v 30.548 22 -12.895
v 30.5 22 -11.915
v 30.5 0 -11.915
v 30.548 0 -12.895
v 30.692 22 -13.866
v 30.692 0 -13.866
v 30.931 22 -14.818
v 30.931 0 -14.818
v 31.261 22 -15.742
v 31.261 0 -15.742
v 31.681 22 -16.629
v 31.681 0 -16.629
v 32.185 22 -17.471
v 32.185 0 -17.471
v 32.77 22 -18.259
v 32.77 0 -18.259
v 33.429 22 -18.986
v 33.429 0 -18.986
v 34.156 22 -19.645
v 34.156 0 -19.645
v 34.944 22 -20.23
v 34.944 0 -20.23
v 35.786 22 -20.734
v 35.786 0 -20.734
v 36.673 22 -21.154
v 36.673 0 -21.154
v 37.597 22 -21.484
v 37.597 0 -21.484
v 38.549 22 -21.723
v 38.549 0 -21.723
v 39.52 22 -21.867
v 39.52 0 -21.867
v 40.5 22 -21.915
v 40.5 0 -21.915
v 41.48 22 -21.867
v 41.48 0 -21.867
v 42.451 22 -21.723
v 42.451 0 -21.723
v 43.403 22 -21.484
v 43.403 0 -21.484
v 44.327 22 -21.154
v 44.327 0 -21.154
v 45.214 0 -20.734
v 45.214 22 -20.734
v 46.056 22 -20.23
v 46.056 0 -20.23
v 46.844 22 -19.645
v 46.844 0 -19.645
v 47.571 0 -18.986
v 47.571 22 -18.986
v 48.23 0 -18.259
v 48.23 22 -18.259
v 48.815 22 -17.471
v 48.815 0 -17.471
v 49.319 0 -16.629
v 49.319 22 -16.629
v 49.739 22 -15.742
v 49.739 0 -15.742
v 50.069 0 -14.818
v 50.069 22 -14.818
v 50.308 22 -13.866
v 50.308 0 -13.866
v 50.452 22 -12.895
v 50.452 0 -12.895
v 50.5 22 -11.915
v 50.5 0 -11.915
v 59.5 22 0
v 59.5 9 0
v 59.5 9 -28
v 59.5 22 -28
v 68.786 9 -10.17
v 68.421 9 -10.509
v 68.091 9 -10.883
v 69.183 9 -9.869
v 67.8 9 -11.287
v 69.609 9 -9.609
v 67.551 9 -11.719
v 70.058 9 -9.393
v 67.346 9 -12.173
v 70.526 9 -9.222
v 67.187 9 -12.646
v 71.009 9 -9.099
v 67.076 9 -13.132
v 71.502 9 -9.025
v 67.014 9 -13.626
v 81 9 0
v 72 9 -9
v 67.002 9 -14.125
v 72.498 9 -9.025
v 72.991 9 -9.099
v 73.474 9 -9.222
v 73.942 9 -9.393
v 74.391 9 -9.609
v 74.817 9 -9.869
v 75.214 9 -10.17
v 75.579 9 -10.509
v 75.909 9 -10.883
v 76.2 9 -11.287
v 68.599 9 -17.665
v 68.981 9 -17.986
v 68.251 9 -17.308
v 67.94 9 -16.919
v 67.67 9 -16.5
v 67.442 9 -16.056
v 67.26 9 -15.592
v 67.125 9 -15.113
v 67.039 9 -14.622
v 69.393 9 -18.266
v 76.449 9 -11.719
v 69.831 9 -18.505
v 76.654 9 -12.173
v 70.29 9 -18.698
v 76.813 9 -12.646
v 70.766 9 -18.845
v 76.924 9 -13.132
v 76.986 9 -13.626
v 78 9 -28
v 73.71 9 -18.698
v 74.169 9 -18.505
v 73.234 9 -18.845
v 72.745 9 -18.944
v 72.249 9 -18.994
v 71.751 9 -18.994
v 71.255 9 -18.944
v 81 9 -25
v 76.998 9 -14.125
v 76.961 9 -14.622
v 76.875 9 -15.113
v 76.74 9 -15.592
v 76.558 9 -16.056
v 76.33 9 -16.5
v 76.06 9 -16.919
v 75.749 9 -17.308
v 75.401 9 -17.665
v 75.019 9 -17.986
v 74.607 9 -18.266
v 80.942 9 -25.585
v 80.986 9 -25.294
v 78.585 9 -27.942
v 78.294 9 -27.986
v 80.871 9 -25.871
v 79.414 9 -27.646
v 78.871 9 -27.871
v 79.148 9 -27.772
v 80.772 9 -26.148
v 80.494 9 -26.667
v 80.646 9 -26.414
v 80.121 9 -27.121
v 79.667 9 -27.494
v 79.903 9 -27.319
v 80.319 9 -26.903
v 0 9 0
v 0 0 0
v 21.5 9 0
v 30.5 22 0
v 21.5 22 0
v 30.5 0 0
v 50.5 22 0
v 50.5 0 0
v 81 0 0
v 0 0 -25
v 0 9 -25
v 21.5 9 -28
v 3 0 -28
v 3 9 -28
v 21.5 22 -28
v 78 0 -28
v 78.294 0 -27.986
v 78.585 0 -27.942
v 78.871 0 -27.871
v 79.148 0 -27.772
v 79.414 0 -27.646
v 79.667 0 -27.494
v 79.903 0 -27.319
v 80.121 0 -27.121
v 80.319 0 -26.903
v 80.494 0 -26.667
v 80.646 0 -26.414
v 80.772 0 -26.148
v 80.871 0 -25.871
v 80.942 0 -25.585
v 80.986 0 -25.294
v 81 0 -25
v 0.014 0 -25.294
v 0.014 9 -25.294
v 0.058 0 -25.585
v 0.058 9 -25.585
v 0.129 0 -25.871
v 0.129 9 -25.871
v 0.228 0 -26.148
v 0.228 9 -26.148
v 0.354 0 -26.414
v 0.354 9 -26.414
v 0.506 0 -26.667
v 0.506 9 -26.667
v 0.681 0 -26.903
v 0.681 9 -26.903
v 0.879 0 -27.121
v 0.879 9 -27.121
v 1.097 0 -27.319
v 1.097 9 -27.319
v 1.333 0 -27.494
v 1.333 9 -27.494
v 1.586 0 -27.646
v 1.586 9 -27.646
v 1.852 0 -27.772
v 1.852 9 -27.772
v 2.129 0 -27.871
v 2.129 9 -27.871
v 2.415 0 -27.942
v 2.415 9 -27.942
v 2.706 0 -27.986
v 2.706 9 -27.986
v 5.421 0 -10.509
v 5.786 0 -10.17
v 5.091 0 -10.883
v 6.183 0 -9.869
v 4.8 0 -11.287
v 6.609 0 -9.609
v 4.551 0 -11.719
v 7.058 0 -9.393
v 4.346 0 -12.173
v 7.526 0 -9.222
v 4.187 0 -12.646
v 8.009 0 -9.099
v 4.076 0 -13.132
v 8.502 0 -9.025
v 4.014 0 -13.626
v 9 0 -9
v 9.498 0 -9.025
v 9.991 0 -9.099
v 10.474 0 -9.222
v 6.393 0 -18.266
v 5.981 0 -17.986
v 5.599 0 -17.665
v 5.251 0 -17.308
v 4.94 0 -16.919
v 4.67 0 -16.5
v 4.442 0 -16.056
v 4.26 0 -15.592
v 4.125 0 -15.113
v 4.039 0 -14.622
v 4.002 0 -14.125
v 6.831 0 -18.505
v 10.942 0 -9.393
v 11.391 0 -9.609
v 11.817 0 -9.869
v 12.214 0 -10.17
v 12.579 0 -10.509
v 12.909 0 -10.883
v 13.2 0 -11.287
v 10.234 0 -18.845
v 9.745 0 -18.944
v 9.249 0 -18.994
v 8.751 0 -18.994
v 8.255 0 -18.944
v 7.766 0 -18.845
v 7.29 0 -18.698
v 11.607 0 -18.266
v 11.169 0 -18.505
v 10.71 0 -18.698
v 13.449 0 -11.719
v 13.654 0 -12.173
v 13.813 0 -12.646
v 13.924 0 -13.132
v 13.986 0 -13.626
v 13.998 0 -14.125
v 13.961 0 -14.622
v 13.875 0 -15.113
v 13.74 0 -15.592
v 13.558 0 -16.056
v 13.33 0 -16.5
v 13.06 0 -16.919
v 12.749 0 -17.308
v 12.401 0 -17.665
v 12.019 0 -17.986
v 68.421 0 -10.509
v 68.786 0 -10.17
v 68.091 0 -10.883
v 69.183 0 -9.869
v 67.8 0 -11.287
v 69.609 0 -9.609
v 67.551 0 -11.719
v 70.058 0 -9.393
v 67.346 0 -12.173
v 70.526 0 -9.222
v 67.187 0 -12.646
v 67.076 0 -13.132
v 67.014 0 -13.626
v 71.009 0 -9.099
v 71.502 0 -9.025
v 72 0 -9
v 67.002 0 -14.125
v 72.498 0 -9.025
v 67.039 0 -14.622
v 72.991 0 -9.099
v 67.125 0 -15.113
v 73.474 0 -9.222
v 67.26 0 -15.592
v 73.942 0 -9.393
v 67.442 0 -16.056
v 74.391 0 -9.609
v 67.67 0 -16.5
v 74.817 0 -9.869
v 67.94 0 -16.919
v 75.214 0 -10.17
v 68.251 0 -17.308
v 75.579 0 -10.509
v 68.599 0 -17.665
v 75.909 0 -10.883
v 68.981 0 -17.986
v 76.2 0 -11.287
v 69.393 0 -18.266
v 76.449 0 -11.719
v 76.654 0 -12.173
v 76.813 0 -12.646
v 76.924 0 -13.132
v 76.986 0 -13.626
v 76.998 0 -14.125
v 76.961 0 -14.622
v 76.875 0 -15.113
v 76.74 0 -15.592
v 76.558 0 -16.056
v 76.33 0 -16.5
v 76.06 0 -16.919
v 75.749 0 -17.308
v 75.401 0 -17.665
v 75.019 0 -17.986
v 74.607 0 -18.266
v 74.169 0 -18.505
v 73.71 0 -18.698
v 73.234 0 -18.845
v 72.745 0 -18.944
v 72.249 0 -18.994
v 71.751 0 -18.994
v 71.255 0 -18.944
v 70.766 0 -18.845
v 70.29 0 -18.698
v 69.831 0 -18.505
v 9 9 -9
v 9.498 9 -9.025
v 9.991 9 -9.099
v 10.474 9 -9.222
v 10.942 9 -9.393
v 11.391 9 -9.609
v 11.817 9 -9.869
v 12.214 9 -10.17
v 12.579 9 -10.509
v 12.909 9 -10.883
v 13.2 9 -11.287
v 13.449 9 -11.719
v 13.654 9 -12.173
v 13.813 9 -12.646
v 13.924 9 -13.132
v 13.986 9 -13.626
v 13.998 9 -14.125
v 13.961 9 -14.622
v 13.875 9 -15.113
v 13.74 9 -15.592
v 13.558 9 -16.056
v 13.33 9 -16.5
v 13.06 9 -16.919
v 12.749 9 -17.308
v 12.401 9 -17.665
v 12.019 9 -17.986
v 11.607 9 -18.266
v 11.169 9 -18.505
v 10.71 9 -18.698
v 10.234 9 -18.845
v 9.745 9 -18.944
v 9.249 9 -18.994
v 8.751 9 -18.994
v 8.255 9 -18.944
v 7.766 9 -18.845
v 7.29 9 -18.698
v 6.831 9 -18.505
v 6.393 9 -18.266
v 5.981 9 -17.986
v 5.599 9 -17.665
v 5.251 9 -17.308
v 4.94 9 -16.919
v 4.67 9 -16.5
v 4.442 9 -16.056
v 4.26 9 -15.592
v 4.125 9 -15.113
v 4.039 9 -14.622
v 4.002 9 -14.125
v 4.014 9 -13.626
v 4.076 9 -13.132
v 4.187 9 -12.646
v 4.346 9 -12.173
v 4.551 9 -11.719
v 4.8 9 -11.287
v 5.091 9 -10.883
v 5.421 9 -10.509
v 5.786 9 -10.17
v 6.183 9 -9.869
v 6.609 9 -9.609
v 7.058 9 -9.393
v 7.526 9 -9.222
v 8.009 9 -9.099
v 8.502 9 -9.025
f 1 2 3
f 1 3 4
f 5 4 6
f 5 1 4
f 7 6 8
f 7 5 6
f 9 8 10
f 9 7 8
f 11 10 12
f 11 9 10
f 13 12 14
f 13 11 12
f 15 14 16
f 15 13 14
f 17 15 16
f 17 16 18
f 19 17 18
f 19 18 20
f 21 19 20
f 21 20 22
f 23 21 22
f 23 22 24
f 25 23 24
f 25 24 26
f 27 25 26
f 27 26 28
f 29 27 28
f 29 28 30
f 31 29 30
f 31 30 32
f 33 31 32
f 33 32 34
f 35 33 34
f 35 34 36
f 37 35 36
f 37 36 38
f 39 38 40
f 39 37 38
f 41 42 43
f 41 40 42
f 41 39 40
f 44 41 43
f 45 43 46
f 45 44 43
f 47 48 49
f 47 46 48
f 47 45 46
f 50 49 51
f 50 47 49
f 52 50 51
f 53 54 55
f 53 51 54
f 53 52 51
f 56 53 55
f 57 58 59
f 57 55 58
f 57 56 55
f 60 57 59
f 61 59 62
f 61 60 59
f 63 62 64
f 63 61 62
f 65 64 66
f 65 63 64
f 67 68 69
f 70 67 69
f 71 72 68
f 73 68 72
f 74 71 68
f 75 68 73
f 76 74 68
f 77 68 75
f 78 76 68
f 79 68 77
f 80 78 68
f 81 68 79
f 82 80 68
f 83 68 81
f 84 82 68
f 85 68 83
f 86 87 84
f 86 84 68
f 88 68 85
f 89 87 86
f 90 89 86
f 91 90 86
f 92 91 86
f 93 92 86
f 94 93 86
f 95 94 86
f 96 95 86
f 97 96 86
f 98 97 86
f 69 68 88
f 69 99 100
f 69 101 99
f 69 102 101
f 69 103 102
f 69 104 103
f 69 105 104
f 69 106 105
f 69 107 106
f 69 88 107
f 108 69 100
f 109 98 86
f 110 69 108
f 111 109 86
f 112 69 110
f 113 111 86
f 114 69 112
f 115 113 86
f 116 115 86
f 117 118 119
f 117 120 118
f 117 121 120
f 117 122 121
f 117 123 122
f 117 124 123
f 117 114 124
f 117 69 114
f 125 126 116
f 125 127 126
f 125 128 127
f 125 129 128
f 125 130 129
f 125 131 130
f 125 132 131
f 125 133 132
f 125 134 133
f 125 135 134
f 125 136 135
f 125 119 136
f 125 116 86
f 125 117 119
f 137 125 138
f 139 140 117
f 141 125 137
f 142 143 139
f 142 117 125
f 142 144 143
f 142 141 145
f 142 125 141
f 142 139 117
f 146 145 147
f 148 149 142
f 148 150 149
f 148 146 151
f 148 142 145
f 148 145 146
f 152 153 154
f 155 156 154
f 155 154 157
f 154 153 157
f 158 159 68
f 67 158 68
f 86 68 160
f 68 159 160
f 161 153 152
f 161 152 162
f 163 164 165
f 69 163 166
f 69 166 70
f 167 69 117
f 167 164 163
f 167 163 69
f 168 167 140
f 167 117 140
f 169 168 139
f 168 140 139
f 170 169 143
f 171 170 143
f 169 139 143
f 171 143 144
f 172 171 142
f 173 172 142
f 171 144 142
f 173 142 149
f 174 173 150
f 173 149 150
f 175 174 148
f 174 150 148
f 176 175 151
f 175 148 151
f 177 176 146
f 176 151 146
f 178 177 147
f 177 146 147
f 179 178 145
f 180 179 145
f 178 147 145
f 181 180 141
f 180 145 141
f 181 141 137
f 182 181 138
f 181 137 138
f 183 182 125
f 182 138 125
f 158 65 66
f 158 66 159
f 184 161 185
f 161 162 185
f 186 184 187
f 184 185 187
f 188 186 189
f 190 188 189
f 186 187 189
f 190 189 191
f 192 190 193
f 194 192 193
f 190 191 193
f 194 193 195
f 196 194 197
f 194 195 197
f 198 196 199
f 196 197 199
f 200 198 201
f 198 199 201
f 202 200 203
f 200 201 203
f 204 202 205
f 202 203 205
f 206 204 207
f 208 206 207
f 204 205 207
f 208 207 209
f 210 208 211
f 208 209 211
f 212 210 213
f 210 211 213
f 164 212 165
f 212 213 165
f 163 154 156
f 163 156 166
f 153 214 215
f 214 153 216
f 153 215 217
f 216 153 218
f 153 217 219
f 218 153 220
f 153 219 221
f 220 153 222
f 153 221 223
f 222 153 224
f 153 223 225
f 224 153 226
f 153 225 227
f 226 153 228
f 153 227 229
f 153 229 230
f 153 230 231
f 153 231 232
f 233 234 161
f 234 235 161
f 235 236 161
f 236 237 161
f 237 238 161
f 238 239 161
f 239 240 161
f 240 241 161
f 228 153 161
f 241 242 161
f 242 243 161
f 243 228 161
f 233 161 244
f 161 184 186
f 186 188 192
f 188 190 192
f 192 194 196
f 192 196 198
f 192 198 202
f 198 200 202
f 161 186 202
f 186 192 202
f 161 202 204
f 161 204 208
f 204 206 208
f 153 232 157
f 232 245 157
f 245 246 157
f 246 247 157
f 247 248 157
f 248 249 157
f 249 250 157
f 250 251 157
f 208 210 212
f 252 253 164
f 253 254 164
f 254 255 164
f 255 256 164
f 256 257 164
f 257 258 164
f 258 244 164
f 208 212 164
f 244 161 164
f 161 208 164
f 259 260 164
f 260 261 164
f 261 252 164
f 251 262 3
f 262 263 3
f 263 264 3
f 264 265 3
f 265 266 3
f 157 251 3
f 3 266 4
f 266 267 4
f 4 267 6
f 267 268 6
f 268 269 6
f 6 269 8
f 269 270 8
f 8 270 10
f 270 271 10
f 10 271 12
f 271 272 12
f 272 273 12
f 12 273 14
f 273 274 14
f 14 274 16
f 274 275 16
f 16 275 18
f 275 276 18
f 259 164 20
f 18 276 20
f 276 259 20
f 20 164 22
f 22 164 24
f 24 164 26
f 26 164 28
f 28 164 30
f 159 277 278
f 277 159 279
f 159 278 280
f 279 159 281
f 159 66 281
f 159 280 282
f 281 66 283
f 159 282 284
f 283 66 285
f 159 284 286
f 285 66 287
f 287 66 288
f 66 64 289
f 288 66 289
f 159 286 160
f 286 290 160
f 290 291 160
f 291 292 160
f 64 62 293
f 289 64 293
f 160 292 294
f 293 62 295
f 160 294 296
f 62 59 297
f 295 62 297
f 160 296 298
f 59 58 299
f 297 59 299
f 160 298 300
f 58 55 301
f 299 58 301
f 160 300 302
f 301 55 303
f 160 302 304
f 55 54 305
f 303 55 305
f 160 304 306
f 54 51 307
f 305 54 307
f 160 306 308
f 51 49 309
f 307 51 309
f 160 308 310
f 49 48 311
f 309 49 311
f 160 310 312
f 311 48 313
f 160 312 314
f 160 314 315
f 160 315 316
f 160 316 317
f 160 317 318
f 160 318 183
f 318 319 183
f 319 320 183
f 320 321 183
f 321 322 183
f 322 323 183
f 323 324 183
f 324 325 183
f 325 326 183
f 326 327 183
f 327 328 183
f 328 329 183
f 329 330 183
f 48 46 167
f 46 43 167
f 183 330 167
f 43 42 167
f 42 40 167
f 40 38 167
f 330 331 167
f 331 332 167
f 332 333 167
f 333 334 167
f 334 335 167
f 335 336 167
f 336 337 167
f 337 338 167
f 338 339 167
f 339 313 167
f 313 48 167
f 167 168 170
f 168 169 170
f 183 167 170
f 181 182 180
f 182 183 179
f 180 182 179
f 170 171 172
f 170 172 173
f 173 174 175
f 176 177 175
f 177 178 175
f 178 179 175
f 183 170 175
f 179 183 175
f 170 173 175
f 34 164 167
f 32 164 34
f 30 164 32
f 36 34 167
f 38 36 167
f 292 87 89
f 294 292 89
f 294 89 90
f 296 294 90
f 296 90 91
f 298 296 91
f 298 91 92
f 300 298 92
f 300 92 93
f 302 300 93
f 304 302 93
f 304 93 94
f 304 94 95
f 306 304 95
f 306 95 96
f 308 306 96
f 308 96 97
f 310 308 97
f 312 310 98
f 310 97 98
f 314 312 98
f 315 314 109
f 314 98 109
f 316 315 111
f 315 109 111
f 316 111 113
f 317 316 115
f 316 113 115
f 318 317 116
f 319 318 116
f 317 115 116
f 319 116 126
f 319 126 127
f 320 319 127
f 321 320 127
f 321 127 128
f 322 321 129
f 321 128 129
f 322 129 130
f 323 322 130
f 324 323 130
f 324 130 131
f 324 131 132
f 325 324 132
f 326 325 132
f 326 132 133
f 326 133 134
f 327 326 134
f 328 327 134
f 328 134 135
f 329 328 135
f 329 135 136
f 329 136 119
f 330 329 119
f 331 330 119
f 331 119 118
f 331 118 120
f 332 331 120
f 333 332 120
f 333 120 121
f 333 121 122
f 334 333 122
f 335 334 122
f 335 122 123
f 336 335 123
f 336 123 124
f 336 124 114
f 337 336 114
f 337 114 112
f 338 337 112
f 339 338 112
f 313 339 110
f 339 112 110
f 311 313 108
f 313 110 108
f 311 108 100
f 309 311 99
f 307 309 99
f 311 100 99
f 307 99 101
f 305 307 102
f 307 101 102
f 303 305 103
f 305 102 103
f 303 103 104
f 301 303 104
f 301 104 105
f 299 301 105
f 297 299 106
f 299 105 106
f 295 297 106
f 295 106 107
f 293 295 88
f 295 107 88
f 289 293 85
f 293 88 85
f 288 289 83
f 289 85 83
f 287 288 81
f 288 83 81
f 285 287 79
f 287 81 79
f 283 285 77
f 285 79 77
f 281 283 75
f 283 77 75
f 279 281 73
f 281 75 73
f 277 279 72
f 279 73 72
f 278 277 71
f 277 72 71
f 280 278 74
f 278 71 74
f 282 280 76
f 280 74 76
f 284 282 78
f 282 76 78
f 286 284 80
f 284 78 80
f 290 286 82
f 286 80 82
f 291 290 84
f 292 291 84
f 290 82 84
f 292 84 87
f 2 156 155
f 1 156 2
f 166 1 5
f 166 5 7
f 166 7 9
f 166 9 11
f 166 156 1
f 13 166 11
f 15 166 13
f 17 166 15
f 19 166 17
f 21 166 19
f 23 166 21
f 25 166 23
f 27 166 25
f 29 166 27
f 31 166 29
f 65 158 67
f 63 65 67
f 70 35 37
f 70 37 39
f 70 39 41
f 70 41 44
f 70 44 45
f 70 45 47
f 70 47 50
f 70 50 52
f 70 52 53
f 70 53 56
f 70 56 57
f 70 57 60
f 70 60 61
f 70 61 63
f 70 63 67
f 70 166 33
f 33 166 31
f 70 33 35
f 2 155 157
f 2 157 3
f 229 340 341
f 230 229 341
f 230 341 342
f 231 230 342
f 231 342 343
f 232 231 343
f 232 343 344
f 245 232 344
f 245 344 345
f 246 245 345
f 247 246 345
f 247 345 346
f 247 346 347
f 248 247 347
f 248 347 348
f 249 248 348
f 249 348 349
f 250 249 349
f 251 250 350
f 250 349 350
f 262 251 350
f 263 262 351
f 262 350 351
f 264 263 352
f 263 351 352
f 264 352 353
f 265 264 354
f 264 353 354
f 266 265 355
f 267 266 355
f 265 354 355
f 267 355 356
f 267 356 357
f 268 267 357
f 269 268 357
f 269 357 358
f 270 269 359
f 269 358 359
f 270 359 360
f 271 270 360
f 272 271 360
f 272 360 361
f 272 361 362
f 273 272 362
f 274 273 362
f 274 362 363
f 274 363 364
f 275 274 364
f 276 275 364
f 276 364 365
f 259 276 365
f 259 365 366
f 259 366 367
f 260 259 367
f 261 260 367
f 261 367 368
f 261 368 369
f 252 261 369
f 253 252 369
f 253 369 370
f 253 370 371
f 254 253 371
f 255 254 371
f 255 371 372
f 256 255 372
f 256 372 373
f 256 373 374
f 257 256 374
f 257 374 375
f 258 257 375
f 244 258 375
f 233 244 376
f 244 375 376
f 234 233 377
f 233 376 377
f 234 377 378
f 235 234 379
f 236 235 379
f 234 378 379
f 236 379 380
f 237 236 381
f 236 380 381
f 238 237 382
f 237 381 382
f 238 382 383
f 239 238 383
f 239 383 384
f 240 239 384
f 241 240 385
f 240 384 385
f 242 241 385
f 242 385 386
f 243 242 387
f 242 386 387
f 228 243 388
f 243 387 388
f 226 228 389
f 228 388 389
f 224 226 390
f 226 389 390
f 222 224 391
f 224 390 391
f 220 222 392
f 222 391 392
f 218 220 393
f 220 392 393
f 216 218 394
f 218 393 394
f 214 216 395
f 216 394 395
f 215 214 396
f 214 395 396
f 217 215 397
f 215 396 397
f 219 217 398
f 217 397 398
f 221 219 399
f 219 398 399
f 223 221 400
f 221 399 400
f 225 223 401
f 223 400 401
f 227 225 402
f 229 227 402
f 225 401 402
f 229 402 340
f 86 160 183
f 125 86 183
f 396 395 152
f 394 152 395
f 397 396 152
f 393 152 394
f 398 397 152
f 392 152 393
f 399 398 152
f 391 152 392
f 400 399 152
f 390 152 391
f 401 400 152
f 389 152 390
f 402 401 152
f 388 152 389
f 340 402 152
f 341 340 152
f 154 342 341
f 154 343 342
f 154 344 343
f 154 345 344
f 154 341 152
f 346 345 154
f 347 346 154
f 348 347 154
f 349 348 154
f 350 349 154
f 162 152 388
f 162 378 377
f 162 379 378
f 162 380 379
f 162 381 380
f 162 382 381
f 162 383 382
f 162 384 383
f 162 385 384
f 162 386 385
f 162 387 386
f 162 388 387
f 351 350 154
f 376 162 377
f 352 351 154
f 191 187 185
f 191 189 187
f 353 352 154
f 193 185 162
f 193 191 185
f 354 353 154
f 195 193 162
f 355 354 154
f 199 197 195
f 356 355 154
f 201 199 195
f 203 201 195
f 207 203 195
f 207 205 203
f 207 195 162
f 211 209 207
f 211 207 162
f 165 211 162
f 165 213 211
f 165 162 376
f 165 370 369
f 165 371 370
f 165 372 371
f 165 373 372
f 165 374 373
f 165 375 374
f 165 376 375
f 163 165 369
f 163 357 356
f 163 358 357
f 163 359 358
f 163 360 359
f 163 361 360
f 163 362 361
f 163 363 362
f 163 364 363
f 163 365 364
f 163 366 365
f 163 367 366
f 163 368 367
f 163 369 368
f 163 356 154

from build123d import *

# Parameters (mm, degrees)
SKETCH_1_W          = 81
SKETCH_1_H          = 28
EXTRUDE_1_DEPTH     = 9
SKETCH_2_W          = 38
SKETCH_2_H          = 28
EXTRUDE_2_DEPTH     = 13
CUT_EXTRUDE_1_DEPTH = 33
SKETCH_4_R          = 5
CUT_EXTRUDE_2_DEPTH = 33
SKETCH_5_R          = 5
CUT_EXTRUDE_3_DEPTH = 33
FILLET_1_R          = 3


with BuildPart() as part:
    # 스케치1 → 보스-돌출1 (new body)
    with BuildSketch(Plane(origin=(0, 0, 0), x_dir=(1, 0, 0), z_dir=(0, 1, 0))):
        with Locations((40.5, 14)):
            Rectangle(SKETCH_1_W, SKETCH_1_H)
    extrude(amount=EXTRUDE_1_DEPTH)

    # 스케치2 → 보스-돌출2 (add)
    with BuildSketch(Plane(origin=(0, 9, 0), x_dir=(1, 0, 0), z_dir=(0, 1, 0))):
        with Locations((40.5, 14)):
            Rectangle(SKETCH_2_W, SKETCH_2_H)
    extrude(amount=EXTRUDE_2_DEPTH)

    # 스케치3 → 컷-돌출1 (cut)
    with BuildSketch(Plane(origin=(0, 22, 0), x_dir=(1, 0, 0), z_dir=(0, 1, 0))):
        with BuildLine():
            Line((30.5, 0), (30.5, 11.914888689))
            ThreePointArc((30.5, 11.914888689), (40.5, 21.914888689), (50.5, 11.914888689))
            Line((50.5, 11.914888689), (50.5, 0))
            Line((50.5, 0), (30.5, 0))
        make_face()
    extrude(amount=-CUT_EXTRUDE_1_DEPTH, mode=Mode.SUBTRACT)

    # 스케치4 → 컷-돌출2 (cut)
    with BuildSketch(Plane(origin=(0, 9, 0), x_dir=(1, 0, 0), z_dir=(0, 1, 0))):
        with Locations(Location((9, 14, 0), (0, 0, 270))):
            Circle(SKETCH_4_R)
    extrude(amount=-CUT_EXTRUDE_2_DEPTH, mode=Mode.SUBTRACT)

    # 스케치5 → 컷-돌출3 (cut)
    with BuildSketch(Plane(origin=(0, 9, 0), x_dir=(1, 0, 0), z_dir=(0, 1, 0))):
        with Locations(Location((72, 14, 0), (0, 0, 270))):
            Circle(SKETCH_5_R)
    extrude(amount=-CUT_EXTRUDE_3_DEPTH, mode=Mode.SUBTRACT)

    # 필렛1
    fillet_1_edges = [part.edges().sort_by_distance(p)[0] for p in [
        (0, 4.5, -28),
        (81, 4.5, -28),
    ]]
    fillet(fillet_1_edges, radius=FILLET_1_R)


solid = part.part
